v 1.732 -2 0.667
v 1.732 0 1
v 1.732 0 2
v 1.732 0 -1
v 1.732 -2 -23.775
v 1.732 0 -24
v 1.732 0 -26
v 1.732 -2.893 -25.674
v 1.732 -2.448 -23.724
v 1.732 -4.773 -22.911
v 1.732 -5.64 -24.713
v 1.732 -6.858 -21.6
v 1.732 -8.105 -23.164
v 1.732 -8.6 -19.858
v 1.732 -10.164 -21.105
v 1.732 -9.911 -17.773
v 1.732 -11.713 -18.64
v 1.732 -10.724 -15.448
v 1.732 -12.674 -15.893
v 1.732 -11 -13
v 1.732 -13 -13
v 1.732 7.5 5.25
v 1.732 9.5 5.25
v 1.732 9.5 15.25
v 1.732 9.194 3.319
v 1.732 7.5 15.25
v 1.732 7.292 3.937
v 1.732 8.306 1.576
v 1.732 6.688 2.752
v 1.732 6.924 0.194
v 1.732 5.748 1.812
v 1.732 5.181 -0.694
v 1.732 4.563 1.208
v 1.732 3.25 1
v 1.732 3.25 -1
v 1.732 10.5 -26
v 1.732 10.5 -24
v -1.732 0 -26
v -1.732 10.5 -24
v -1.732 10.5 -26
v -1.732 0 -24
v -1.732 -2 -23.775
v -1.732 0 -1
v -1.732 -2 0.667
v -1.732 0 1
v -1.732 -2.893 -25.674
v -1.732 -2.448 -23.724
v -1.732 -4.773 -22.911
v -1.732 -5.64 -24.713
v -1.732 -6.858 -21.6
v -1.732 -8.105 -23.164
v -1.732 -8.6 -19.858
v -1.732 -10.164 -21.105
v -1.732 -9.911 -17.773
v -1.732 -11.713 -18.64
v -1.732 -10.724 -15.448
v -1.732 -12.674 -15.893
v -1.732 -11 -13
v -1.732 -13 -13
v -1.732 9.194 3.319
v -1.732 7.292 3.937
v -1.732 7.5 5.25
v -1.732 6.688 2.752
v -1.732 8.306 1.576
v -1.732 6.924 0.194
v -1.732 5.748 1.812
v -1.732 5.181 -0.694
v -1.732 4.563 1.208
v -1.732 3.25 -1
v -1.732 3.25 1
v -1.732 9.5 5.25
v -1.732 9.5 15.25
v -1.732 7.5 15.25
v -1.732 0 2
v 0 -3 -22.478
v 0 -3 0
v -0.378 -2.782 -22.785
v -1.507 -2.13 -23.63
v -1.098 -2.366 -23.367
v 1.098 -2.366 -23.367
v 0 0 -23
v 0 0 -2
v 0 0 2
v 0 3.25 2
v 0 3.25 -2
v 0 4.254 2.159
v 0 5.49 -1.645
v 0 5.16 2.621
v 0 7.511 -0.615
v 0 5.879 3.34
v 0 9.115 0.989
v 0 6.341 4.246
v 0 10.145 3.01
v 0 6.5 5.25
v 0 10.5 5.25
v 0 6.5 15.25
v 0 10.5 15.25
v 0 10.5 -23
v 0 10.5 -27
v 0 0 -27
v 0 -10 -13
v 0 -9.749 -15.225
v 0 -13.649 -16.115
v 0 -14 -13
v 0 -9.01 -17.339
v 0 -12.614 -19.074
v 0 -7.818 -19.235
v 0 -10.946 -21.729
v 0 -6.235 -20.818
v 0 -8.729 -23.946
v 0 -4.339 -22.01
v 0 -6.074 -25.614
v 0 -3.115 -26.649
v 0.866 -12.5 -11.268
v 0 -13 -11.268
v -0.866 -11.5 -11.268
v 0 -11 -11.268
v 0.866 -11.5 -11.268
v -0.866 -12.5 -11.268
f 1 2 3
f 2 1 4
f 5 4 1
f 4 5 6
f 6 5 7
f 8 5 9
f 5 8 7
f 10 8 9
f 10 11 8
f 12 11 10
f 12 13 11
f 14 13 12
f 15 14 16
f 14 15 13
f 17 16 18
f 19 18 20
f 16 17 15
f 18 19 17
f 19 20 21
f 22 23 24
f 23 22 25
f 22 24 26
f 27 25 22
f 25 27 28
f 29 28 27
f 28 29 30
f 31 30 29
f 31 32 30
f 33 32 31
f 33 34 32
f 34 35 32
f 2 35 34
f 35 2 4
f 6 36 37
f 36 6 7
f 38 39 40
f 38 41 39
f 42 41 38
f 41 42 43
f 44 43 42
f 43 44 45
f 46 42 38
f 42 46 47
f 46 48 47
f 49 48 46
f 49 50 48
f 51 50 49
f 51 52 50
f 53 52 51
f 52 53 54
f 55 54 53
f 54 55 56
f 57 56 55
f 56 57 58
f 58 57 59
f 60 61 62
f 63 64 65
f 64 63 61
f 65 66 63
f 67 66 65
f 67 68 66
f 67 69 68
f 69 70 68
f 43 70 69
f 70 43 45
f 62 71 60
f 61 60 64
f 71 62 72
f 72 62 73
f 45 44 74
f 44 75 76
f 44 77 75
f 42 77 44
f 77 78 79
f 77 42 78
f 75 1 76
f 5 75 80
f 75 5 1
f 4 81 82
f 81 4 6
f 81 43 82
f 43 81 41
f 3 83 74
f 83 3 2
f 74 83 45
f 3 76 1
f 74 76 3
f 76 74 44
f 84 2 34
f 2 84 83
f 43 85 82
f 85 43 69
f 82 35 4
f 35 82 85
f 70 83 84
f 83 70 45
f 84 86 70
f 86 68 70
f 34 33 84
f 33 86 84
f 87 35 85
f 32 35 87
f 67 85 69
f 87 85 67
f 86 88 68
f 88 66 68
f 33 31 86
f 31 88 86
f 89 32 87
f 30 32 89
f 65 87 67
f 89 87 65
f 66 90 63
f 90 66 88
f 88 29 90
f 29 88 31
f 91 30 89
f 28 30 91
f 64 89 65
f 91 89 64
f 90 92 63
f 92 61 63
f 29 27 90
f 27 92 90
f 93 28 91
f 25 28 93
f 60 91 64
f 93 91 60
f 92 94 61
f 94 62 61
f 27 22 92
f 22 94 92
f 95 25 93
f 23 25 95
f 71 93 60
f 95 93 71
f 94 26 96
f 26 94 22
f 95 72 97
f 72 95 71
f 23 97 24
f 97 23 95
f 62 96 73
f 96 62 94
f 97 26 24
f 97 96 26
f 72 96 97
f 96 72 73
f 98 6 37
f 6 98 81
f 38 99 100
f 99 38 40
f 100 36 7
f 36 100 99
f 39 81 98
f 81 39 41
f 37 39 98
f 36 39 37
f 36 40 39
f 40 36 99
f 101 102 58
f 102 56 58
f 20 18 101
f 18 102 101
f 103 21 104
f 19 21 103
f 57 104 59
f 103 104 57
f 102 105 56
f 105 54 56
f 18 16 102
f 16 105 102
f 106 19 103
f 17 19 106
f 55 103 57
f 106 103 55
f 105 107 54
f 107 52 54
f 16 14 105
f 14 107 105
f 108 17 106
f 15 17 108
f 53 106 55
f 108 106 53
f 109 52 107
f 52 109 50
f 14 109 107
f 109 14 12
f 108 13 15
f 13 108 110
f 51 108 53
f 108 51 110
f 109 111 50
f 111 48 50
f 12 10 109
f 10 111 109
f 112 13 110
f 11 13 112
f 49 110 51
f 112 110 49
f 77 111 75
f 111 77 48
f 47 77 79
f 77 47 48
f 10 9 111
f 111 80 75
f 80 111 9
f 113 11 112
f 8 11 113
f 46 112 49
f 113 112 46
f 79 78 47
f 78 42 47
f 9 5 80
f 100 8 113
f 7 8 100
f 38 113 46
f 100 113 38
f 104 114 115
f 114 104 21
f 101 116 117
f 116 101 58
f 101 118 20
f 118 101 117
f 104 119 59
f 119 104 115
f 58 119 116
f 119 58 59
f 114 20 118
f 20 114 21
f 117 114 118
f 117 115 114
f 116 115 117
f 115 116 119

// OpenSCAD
I = 25;
R = 2;
W = R * sqrt(3) / 2;
thick = 6.5;

rotate([-90, 30, 0])
    cylinder(r = R, h = thick / 2, $fn = 6);
translate([0, thick / 2, thick / 2 + R])
    rotate([0, 90, 0])
        rotate_extrude(angle = 90)
            translate([thick / 2 + R, 0])
                circle(r = R, $fn = 6);
translate([0, thick + R, thick / 2 + R])
    rotate([0, 0, 30])
        cylinder(r = R, h = 10, $fn = 6);

translate([0, 0, -I])
    rotate([-90, 30, 0])
        cylinder(r = R, h = thick + R * 2, $fn = 6);

difference() {
    translate([0, -R / 2, -I])
        rotate([0, 0, 30])
            cylinder(r = R, h = I + R, $fn = 6);
    translate([-50, 0, -I])
        cube([100, 100, 100]);
    translate([-R, 0, 0])
        rotate([0, 90, 0])
            linear_extrude(R * 2)
                polygon([[0, -1.5 * R], [-R, -1.5 * R], [-R, 0]]);
}

translate([0, 0, -I + 10 + R])
    rotate([-90, 0, -90])
        rotate_extrude(angle = 90)
            translate([10 + R, 0])
                circle(r = R, $fn = 6);
translate([0, -10 - R, -I + 10 + R])
    rotate([0, 0, 30])
        sphere(r = R, $fn = 6);
